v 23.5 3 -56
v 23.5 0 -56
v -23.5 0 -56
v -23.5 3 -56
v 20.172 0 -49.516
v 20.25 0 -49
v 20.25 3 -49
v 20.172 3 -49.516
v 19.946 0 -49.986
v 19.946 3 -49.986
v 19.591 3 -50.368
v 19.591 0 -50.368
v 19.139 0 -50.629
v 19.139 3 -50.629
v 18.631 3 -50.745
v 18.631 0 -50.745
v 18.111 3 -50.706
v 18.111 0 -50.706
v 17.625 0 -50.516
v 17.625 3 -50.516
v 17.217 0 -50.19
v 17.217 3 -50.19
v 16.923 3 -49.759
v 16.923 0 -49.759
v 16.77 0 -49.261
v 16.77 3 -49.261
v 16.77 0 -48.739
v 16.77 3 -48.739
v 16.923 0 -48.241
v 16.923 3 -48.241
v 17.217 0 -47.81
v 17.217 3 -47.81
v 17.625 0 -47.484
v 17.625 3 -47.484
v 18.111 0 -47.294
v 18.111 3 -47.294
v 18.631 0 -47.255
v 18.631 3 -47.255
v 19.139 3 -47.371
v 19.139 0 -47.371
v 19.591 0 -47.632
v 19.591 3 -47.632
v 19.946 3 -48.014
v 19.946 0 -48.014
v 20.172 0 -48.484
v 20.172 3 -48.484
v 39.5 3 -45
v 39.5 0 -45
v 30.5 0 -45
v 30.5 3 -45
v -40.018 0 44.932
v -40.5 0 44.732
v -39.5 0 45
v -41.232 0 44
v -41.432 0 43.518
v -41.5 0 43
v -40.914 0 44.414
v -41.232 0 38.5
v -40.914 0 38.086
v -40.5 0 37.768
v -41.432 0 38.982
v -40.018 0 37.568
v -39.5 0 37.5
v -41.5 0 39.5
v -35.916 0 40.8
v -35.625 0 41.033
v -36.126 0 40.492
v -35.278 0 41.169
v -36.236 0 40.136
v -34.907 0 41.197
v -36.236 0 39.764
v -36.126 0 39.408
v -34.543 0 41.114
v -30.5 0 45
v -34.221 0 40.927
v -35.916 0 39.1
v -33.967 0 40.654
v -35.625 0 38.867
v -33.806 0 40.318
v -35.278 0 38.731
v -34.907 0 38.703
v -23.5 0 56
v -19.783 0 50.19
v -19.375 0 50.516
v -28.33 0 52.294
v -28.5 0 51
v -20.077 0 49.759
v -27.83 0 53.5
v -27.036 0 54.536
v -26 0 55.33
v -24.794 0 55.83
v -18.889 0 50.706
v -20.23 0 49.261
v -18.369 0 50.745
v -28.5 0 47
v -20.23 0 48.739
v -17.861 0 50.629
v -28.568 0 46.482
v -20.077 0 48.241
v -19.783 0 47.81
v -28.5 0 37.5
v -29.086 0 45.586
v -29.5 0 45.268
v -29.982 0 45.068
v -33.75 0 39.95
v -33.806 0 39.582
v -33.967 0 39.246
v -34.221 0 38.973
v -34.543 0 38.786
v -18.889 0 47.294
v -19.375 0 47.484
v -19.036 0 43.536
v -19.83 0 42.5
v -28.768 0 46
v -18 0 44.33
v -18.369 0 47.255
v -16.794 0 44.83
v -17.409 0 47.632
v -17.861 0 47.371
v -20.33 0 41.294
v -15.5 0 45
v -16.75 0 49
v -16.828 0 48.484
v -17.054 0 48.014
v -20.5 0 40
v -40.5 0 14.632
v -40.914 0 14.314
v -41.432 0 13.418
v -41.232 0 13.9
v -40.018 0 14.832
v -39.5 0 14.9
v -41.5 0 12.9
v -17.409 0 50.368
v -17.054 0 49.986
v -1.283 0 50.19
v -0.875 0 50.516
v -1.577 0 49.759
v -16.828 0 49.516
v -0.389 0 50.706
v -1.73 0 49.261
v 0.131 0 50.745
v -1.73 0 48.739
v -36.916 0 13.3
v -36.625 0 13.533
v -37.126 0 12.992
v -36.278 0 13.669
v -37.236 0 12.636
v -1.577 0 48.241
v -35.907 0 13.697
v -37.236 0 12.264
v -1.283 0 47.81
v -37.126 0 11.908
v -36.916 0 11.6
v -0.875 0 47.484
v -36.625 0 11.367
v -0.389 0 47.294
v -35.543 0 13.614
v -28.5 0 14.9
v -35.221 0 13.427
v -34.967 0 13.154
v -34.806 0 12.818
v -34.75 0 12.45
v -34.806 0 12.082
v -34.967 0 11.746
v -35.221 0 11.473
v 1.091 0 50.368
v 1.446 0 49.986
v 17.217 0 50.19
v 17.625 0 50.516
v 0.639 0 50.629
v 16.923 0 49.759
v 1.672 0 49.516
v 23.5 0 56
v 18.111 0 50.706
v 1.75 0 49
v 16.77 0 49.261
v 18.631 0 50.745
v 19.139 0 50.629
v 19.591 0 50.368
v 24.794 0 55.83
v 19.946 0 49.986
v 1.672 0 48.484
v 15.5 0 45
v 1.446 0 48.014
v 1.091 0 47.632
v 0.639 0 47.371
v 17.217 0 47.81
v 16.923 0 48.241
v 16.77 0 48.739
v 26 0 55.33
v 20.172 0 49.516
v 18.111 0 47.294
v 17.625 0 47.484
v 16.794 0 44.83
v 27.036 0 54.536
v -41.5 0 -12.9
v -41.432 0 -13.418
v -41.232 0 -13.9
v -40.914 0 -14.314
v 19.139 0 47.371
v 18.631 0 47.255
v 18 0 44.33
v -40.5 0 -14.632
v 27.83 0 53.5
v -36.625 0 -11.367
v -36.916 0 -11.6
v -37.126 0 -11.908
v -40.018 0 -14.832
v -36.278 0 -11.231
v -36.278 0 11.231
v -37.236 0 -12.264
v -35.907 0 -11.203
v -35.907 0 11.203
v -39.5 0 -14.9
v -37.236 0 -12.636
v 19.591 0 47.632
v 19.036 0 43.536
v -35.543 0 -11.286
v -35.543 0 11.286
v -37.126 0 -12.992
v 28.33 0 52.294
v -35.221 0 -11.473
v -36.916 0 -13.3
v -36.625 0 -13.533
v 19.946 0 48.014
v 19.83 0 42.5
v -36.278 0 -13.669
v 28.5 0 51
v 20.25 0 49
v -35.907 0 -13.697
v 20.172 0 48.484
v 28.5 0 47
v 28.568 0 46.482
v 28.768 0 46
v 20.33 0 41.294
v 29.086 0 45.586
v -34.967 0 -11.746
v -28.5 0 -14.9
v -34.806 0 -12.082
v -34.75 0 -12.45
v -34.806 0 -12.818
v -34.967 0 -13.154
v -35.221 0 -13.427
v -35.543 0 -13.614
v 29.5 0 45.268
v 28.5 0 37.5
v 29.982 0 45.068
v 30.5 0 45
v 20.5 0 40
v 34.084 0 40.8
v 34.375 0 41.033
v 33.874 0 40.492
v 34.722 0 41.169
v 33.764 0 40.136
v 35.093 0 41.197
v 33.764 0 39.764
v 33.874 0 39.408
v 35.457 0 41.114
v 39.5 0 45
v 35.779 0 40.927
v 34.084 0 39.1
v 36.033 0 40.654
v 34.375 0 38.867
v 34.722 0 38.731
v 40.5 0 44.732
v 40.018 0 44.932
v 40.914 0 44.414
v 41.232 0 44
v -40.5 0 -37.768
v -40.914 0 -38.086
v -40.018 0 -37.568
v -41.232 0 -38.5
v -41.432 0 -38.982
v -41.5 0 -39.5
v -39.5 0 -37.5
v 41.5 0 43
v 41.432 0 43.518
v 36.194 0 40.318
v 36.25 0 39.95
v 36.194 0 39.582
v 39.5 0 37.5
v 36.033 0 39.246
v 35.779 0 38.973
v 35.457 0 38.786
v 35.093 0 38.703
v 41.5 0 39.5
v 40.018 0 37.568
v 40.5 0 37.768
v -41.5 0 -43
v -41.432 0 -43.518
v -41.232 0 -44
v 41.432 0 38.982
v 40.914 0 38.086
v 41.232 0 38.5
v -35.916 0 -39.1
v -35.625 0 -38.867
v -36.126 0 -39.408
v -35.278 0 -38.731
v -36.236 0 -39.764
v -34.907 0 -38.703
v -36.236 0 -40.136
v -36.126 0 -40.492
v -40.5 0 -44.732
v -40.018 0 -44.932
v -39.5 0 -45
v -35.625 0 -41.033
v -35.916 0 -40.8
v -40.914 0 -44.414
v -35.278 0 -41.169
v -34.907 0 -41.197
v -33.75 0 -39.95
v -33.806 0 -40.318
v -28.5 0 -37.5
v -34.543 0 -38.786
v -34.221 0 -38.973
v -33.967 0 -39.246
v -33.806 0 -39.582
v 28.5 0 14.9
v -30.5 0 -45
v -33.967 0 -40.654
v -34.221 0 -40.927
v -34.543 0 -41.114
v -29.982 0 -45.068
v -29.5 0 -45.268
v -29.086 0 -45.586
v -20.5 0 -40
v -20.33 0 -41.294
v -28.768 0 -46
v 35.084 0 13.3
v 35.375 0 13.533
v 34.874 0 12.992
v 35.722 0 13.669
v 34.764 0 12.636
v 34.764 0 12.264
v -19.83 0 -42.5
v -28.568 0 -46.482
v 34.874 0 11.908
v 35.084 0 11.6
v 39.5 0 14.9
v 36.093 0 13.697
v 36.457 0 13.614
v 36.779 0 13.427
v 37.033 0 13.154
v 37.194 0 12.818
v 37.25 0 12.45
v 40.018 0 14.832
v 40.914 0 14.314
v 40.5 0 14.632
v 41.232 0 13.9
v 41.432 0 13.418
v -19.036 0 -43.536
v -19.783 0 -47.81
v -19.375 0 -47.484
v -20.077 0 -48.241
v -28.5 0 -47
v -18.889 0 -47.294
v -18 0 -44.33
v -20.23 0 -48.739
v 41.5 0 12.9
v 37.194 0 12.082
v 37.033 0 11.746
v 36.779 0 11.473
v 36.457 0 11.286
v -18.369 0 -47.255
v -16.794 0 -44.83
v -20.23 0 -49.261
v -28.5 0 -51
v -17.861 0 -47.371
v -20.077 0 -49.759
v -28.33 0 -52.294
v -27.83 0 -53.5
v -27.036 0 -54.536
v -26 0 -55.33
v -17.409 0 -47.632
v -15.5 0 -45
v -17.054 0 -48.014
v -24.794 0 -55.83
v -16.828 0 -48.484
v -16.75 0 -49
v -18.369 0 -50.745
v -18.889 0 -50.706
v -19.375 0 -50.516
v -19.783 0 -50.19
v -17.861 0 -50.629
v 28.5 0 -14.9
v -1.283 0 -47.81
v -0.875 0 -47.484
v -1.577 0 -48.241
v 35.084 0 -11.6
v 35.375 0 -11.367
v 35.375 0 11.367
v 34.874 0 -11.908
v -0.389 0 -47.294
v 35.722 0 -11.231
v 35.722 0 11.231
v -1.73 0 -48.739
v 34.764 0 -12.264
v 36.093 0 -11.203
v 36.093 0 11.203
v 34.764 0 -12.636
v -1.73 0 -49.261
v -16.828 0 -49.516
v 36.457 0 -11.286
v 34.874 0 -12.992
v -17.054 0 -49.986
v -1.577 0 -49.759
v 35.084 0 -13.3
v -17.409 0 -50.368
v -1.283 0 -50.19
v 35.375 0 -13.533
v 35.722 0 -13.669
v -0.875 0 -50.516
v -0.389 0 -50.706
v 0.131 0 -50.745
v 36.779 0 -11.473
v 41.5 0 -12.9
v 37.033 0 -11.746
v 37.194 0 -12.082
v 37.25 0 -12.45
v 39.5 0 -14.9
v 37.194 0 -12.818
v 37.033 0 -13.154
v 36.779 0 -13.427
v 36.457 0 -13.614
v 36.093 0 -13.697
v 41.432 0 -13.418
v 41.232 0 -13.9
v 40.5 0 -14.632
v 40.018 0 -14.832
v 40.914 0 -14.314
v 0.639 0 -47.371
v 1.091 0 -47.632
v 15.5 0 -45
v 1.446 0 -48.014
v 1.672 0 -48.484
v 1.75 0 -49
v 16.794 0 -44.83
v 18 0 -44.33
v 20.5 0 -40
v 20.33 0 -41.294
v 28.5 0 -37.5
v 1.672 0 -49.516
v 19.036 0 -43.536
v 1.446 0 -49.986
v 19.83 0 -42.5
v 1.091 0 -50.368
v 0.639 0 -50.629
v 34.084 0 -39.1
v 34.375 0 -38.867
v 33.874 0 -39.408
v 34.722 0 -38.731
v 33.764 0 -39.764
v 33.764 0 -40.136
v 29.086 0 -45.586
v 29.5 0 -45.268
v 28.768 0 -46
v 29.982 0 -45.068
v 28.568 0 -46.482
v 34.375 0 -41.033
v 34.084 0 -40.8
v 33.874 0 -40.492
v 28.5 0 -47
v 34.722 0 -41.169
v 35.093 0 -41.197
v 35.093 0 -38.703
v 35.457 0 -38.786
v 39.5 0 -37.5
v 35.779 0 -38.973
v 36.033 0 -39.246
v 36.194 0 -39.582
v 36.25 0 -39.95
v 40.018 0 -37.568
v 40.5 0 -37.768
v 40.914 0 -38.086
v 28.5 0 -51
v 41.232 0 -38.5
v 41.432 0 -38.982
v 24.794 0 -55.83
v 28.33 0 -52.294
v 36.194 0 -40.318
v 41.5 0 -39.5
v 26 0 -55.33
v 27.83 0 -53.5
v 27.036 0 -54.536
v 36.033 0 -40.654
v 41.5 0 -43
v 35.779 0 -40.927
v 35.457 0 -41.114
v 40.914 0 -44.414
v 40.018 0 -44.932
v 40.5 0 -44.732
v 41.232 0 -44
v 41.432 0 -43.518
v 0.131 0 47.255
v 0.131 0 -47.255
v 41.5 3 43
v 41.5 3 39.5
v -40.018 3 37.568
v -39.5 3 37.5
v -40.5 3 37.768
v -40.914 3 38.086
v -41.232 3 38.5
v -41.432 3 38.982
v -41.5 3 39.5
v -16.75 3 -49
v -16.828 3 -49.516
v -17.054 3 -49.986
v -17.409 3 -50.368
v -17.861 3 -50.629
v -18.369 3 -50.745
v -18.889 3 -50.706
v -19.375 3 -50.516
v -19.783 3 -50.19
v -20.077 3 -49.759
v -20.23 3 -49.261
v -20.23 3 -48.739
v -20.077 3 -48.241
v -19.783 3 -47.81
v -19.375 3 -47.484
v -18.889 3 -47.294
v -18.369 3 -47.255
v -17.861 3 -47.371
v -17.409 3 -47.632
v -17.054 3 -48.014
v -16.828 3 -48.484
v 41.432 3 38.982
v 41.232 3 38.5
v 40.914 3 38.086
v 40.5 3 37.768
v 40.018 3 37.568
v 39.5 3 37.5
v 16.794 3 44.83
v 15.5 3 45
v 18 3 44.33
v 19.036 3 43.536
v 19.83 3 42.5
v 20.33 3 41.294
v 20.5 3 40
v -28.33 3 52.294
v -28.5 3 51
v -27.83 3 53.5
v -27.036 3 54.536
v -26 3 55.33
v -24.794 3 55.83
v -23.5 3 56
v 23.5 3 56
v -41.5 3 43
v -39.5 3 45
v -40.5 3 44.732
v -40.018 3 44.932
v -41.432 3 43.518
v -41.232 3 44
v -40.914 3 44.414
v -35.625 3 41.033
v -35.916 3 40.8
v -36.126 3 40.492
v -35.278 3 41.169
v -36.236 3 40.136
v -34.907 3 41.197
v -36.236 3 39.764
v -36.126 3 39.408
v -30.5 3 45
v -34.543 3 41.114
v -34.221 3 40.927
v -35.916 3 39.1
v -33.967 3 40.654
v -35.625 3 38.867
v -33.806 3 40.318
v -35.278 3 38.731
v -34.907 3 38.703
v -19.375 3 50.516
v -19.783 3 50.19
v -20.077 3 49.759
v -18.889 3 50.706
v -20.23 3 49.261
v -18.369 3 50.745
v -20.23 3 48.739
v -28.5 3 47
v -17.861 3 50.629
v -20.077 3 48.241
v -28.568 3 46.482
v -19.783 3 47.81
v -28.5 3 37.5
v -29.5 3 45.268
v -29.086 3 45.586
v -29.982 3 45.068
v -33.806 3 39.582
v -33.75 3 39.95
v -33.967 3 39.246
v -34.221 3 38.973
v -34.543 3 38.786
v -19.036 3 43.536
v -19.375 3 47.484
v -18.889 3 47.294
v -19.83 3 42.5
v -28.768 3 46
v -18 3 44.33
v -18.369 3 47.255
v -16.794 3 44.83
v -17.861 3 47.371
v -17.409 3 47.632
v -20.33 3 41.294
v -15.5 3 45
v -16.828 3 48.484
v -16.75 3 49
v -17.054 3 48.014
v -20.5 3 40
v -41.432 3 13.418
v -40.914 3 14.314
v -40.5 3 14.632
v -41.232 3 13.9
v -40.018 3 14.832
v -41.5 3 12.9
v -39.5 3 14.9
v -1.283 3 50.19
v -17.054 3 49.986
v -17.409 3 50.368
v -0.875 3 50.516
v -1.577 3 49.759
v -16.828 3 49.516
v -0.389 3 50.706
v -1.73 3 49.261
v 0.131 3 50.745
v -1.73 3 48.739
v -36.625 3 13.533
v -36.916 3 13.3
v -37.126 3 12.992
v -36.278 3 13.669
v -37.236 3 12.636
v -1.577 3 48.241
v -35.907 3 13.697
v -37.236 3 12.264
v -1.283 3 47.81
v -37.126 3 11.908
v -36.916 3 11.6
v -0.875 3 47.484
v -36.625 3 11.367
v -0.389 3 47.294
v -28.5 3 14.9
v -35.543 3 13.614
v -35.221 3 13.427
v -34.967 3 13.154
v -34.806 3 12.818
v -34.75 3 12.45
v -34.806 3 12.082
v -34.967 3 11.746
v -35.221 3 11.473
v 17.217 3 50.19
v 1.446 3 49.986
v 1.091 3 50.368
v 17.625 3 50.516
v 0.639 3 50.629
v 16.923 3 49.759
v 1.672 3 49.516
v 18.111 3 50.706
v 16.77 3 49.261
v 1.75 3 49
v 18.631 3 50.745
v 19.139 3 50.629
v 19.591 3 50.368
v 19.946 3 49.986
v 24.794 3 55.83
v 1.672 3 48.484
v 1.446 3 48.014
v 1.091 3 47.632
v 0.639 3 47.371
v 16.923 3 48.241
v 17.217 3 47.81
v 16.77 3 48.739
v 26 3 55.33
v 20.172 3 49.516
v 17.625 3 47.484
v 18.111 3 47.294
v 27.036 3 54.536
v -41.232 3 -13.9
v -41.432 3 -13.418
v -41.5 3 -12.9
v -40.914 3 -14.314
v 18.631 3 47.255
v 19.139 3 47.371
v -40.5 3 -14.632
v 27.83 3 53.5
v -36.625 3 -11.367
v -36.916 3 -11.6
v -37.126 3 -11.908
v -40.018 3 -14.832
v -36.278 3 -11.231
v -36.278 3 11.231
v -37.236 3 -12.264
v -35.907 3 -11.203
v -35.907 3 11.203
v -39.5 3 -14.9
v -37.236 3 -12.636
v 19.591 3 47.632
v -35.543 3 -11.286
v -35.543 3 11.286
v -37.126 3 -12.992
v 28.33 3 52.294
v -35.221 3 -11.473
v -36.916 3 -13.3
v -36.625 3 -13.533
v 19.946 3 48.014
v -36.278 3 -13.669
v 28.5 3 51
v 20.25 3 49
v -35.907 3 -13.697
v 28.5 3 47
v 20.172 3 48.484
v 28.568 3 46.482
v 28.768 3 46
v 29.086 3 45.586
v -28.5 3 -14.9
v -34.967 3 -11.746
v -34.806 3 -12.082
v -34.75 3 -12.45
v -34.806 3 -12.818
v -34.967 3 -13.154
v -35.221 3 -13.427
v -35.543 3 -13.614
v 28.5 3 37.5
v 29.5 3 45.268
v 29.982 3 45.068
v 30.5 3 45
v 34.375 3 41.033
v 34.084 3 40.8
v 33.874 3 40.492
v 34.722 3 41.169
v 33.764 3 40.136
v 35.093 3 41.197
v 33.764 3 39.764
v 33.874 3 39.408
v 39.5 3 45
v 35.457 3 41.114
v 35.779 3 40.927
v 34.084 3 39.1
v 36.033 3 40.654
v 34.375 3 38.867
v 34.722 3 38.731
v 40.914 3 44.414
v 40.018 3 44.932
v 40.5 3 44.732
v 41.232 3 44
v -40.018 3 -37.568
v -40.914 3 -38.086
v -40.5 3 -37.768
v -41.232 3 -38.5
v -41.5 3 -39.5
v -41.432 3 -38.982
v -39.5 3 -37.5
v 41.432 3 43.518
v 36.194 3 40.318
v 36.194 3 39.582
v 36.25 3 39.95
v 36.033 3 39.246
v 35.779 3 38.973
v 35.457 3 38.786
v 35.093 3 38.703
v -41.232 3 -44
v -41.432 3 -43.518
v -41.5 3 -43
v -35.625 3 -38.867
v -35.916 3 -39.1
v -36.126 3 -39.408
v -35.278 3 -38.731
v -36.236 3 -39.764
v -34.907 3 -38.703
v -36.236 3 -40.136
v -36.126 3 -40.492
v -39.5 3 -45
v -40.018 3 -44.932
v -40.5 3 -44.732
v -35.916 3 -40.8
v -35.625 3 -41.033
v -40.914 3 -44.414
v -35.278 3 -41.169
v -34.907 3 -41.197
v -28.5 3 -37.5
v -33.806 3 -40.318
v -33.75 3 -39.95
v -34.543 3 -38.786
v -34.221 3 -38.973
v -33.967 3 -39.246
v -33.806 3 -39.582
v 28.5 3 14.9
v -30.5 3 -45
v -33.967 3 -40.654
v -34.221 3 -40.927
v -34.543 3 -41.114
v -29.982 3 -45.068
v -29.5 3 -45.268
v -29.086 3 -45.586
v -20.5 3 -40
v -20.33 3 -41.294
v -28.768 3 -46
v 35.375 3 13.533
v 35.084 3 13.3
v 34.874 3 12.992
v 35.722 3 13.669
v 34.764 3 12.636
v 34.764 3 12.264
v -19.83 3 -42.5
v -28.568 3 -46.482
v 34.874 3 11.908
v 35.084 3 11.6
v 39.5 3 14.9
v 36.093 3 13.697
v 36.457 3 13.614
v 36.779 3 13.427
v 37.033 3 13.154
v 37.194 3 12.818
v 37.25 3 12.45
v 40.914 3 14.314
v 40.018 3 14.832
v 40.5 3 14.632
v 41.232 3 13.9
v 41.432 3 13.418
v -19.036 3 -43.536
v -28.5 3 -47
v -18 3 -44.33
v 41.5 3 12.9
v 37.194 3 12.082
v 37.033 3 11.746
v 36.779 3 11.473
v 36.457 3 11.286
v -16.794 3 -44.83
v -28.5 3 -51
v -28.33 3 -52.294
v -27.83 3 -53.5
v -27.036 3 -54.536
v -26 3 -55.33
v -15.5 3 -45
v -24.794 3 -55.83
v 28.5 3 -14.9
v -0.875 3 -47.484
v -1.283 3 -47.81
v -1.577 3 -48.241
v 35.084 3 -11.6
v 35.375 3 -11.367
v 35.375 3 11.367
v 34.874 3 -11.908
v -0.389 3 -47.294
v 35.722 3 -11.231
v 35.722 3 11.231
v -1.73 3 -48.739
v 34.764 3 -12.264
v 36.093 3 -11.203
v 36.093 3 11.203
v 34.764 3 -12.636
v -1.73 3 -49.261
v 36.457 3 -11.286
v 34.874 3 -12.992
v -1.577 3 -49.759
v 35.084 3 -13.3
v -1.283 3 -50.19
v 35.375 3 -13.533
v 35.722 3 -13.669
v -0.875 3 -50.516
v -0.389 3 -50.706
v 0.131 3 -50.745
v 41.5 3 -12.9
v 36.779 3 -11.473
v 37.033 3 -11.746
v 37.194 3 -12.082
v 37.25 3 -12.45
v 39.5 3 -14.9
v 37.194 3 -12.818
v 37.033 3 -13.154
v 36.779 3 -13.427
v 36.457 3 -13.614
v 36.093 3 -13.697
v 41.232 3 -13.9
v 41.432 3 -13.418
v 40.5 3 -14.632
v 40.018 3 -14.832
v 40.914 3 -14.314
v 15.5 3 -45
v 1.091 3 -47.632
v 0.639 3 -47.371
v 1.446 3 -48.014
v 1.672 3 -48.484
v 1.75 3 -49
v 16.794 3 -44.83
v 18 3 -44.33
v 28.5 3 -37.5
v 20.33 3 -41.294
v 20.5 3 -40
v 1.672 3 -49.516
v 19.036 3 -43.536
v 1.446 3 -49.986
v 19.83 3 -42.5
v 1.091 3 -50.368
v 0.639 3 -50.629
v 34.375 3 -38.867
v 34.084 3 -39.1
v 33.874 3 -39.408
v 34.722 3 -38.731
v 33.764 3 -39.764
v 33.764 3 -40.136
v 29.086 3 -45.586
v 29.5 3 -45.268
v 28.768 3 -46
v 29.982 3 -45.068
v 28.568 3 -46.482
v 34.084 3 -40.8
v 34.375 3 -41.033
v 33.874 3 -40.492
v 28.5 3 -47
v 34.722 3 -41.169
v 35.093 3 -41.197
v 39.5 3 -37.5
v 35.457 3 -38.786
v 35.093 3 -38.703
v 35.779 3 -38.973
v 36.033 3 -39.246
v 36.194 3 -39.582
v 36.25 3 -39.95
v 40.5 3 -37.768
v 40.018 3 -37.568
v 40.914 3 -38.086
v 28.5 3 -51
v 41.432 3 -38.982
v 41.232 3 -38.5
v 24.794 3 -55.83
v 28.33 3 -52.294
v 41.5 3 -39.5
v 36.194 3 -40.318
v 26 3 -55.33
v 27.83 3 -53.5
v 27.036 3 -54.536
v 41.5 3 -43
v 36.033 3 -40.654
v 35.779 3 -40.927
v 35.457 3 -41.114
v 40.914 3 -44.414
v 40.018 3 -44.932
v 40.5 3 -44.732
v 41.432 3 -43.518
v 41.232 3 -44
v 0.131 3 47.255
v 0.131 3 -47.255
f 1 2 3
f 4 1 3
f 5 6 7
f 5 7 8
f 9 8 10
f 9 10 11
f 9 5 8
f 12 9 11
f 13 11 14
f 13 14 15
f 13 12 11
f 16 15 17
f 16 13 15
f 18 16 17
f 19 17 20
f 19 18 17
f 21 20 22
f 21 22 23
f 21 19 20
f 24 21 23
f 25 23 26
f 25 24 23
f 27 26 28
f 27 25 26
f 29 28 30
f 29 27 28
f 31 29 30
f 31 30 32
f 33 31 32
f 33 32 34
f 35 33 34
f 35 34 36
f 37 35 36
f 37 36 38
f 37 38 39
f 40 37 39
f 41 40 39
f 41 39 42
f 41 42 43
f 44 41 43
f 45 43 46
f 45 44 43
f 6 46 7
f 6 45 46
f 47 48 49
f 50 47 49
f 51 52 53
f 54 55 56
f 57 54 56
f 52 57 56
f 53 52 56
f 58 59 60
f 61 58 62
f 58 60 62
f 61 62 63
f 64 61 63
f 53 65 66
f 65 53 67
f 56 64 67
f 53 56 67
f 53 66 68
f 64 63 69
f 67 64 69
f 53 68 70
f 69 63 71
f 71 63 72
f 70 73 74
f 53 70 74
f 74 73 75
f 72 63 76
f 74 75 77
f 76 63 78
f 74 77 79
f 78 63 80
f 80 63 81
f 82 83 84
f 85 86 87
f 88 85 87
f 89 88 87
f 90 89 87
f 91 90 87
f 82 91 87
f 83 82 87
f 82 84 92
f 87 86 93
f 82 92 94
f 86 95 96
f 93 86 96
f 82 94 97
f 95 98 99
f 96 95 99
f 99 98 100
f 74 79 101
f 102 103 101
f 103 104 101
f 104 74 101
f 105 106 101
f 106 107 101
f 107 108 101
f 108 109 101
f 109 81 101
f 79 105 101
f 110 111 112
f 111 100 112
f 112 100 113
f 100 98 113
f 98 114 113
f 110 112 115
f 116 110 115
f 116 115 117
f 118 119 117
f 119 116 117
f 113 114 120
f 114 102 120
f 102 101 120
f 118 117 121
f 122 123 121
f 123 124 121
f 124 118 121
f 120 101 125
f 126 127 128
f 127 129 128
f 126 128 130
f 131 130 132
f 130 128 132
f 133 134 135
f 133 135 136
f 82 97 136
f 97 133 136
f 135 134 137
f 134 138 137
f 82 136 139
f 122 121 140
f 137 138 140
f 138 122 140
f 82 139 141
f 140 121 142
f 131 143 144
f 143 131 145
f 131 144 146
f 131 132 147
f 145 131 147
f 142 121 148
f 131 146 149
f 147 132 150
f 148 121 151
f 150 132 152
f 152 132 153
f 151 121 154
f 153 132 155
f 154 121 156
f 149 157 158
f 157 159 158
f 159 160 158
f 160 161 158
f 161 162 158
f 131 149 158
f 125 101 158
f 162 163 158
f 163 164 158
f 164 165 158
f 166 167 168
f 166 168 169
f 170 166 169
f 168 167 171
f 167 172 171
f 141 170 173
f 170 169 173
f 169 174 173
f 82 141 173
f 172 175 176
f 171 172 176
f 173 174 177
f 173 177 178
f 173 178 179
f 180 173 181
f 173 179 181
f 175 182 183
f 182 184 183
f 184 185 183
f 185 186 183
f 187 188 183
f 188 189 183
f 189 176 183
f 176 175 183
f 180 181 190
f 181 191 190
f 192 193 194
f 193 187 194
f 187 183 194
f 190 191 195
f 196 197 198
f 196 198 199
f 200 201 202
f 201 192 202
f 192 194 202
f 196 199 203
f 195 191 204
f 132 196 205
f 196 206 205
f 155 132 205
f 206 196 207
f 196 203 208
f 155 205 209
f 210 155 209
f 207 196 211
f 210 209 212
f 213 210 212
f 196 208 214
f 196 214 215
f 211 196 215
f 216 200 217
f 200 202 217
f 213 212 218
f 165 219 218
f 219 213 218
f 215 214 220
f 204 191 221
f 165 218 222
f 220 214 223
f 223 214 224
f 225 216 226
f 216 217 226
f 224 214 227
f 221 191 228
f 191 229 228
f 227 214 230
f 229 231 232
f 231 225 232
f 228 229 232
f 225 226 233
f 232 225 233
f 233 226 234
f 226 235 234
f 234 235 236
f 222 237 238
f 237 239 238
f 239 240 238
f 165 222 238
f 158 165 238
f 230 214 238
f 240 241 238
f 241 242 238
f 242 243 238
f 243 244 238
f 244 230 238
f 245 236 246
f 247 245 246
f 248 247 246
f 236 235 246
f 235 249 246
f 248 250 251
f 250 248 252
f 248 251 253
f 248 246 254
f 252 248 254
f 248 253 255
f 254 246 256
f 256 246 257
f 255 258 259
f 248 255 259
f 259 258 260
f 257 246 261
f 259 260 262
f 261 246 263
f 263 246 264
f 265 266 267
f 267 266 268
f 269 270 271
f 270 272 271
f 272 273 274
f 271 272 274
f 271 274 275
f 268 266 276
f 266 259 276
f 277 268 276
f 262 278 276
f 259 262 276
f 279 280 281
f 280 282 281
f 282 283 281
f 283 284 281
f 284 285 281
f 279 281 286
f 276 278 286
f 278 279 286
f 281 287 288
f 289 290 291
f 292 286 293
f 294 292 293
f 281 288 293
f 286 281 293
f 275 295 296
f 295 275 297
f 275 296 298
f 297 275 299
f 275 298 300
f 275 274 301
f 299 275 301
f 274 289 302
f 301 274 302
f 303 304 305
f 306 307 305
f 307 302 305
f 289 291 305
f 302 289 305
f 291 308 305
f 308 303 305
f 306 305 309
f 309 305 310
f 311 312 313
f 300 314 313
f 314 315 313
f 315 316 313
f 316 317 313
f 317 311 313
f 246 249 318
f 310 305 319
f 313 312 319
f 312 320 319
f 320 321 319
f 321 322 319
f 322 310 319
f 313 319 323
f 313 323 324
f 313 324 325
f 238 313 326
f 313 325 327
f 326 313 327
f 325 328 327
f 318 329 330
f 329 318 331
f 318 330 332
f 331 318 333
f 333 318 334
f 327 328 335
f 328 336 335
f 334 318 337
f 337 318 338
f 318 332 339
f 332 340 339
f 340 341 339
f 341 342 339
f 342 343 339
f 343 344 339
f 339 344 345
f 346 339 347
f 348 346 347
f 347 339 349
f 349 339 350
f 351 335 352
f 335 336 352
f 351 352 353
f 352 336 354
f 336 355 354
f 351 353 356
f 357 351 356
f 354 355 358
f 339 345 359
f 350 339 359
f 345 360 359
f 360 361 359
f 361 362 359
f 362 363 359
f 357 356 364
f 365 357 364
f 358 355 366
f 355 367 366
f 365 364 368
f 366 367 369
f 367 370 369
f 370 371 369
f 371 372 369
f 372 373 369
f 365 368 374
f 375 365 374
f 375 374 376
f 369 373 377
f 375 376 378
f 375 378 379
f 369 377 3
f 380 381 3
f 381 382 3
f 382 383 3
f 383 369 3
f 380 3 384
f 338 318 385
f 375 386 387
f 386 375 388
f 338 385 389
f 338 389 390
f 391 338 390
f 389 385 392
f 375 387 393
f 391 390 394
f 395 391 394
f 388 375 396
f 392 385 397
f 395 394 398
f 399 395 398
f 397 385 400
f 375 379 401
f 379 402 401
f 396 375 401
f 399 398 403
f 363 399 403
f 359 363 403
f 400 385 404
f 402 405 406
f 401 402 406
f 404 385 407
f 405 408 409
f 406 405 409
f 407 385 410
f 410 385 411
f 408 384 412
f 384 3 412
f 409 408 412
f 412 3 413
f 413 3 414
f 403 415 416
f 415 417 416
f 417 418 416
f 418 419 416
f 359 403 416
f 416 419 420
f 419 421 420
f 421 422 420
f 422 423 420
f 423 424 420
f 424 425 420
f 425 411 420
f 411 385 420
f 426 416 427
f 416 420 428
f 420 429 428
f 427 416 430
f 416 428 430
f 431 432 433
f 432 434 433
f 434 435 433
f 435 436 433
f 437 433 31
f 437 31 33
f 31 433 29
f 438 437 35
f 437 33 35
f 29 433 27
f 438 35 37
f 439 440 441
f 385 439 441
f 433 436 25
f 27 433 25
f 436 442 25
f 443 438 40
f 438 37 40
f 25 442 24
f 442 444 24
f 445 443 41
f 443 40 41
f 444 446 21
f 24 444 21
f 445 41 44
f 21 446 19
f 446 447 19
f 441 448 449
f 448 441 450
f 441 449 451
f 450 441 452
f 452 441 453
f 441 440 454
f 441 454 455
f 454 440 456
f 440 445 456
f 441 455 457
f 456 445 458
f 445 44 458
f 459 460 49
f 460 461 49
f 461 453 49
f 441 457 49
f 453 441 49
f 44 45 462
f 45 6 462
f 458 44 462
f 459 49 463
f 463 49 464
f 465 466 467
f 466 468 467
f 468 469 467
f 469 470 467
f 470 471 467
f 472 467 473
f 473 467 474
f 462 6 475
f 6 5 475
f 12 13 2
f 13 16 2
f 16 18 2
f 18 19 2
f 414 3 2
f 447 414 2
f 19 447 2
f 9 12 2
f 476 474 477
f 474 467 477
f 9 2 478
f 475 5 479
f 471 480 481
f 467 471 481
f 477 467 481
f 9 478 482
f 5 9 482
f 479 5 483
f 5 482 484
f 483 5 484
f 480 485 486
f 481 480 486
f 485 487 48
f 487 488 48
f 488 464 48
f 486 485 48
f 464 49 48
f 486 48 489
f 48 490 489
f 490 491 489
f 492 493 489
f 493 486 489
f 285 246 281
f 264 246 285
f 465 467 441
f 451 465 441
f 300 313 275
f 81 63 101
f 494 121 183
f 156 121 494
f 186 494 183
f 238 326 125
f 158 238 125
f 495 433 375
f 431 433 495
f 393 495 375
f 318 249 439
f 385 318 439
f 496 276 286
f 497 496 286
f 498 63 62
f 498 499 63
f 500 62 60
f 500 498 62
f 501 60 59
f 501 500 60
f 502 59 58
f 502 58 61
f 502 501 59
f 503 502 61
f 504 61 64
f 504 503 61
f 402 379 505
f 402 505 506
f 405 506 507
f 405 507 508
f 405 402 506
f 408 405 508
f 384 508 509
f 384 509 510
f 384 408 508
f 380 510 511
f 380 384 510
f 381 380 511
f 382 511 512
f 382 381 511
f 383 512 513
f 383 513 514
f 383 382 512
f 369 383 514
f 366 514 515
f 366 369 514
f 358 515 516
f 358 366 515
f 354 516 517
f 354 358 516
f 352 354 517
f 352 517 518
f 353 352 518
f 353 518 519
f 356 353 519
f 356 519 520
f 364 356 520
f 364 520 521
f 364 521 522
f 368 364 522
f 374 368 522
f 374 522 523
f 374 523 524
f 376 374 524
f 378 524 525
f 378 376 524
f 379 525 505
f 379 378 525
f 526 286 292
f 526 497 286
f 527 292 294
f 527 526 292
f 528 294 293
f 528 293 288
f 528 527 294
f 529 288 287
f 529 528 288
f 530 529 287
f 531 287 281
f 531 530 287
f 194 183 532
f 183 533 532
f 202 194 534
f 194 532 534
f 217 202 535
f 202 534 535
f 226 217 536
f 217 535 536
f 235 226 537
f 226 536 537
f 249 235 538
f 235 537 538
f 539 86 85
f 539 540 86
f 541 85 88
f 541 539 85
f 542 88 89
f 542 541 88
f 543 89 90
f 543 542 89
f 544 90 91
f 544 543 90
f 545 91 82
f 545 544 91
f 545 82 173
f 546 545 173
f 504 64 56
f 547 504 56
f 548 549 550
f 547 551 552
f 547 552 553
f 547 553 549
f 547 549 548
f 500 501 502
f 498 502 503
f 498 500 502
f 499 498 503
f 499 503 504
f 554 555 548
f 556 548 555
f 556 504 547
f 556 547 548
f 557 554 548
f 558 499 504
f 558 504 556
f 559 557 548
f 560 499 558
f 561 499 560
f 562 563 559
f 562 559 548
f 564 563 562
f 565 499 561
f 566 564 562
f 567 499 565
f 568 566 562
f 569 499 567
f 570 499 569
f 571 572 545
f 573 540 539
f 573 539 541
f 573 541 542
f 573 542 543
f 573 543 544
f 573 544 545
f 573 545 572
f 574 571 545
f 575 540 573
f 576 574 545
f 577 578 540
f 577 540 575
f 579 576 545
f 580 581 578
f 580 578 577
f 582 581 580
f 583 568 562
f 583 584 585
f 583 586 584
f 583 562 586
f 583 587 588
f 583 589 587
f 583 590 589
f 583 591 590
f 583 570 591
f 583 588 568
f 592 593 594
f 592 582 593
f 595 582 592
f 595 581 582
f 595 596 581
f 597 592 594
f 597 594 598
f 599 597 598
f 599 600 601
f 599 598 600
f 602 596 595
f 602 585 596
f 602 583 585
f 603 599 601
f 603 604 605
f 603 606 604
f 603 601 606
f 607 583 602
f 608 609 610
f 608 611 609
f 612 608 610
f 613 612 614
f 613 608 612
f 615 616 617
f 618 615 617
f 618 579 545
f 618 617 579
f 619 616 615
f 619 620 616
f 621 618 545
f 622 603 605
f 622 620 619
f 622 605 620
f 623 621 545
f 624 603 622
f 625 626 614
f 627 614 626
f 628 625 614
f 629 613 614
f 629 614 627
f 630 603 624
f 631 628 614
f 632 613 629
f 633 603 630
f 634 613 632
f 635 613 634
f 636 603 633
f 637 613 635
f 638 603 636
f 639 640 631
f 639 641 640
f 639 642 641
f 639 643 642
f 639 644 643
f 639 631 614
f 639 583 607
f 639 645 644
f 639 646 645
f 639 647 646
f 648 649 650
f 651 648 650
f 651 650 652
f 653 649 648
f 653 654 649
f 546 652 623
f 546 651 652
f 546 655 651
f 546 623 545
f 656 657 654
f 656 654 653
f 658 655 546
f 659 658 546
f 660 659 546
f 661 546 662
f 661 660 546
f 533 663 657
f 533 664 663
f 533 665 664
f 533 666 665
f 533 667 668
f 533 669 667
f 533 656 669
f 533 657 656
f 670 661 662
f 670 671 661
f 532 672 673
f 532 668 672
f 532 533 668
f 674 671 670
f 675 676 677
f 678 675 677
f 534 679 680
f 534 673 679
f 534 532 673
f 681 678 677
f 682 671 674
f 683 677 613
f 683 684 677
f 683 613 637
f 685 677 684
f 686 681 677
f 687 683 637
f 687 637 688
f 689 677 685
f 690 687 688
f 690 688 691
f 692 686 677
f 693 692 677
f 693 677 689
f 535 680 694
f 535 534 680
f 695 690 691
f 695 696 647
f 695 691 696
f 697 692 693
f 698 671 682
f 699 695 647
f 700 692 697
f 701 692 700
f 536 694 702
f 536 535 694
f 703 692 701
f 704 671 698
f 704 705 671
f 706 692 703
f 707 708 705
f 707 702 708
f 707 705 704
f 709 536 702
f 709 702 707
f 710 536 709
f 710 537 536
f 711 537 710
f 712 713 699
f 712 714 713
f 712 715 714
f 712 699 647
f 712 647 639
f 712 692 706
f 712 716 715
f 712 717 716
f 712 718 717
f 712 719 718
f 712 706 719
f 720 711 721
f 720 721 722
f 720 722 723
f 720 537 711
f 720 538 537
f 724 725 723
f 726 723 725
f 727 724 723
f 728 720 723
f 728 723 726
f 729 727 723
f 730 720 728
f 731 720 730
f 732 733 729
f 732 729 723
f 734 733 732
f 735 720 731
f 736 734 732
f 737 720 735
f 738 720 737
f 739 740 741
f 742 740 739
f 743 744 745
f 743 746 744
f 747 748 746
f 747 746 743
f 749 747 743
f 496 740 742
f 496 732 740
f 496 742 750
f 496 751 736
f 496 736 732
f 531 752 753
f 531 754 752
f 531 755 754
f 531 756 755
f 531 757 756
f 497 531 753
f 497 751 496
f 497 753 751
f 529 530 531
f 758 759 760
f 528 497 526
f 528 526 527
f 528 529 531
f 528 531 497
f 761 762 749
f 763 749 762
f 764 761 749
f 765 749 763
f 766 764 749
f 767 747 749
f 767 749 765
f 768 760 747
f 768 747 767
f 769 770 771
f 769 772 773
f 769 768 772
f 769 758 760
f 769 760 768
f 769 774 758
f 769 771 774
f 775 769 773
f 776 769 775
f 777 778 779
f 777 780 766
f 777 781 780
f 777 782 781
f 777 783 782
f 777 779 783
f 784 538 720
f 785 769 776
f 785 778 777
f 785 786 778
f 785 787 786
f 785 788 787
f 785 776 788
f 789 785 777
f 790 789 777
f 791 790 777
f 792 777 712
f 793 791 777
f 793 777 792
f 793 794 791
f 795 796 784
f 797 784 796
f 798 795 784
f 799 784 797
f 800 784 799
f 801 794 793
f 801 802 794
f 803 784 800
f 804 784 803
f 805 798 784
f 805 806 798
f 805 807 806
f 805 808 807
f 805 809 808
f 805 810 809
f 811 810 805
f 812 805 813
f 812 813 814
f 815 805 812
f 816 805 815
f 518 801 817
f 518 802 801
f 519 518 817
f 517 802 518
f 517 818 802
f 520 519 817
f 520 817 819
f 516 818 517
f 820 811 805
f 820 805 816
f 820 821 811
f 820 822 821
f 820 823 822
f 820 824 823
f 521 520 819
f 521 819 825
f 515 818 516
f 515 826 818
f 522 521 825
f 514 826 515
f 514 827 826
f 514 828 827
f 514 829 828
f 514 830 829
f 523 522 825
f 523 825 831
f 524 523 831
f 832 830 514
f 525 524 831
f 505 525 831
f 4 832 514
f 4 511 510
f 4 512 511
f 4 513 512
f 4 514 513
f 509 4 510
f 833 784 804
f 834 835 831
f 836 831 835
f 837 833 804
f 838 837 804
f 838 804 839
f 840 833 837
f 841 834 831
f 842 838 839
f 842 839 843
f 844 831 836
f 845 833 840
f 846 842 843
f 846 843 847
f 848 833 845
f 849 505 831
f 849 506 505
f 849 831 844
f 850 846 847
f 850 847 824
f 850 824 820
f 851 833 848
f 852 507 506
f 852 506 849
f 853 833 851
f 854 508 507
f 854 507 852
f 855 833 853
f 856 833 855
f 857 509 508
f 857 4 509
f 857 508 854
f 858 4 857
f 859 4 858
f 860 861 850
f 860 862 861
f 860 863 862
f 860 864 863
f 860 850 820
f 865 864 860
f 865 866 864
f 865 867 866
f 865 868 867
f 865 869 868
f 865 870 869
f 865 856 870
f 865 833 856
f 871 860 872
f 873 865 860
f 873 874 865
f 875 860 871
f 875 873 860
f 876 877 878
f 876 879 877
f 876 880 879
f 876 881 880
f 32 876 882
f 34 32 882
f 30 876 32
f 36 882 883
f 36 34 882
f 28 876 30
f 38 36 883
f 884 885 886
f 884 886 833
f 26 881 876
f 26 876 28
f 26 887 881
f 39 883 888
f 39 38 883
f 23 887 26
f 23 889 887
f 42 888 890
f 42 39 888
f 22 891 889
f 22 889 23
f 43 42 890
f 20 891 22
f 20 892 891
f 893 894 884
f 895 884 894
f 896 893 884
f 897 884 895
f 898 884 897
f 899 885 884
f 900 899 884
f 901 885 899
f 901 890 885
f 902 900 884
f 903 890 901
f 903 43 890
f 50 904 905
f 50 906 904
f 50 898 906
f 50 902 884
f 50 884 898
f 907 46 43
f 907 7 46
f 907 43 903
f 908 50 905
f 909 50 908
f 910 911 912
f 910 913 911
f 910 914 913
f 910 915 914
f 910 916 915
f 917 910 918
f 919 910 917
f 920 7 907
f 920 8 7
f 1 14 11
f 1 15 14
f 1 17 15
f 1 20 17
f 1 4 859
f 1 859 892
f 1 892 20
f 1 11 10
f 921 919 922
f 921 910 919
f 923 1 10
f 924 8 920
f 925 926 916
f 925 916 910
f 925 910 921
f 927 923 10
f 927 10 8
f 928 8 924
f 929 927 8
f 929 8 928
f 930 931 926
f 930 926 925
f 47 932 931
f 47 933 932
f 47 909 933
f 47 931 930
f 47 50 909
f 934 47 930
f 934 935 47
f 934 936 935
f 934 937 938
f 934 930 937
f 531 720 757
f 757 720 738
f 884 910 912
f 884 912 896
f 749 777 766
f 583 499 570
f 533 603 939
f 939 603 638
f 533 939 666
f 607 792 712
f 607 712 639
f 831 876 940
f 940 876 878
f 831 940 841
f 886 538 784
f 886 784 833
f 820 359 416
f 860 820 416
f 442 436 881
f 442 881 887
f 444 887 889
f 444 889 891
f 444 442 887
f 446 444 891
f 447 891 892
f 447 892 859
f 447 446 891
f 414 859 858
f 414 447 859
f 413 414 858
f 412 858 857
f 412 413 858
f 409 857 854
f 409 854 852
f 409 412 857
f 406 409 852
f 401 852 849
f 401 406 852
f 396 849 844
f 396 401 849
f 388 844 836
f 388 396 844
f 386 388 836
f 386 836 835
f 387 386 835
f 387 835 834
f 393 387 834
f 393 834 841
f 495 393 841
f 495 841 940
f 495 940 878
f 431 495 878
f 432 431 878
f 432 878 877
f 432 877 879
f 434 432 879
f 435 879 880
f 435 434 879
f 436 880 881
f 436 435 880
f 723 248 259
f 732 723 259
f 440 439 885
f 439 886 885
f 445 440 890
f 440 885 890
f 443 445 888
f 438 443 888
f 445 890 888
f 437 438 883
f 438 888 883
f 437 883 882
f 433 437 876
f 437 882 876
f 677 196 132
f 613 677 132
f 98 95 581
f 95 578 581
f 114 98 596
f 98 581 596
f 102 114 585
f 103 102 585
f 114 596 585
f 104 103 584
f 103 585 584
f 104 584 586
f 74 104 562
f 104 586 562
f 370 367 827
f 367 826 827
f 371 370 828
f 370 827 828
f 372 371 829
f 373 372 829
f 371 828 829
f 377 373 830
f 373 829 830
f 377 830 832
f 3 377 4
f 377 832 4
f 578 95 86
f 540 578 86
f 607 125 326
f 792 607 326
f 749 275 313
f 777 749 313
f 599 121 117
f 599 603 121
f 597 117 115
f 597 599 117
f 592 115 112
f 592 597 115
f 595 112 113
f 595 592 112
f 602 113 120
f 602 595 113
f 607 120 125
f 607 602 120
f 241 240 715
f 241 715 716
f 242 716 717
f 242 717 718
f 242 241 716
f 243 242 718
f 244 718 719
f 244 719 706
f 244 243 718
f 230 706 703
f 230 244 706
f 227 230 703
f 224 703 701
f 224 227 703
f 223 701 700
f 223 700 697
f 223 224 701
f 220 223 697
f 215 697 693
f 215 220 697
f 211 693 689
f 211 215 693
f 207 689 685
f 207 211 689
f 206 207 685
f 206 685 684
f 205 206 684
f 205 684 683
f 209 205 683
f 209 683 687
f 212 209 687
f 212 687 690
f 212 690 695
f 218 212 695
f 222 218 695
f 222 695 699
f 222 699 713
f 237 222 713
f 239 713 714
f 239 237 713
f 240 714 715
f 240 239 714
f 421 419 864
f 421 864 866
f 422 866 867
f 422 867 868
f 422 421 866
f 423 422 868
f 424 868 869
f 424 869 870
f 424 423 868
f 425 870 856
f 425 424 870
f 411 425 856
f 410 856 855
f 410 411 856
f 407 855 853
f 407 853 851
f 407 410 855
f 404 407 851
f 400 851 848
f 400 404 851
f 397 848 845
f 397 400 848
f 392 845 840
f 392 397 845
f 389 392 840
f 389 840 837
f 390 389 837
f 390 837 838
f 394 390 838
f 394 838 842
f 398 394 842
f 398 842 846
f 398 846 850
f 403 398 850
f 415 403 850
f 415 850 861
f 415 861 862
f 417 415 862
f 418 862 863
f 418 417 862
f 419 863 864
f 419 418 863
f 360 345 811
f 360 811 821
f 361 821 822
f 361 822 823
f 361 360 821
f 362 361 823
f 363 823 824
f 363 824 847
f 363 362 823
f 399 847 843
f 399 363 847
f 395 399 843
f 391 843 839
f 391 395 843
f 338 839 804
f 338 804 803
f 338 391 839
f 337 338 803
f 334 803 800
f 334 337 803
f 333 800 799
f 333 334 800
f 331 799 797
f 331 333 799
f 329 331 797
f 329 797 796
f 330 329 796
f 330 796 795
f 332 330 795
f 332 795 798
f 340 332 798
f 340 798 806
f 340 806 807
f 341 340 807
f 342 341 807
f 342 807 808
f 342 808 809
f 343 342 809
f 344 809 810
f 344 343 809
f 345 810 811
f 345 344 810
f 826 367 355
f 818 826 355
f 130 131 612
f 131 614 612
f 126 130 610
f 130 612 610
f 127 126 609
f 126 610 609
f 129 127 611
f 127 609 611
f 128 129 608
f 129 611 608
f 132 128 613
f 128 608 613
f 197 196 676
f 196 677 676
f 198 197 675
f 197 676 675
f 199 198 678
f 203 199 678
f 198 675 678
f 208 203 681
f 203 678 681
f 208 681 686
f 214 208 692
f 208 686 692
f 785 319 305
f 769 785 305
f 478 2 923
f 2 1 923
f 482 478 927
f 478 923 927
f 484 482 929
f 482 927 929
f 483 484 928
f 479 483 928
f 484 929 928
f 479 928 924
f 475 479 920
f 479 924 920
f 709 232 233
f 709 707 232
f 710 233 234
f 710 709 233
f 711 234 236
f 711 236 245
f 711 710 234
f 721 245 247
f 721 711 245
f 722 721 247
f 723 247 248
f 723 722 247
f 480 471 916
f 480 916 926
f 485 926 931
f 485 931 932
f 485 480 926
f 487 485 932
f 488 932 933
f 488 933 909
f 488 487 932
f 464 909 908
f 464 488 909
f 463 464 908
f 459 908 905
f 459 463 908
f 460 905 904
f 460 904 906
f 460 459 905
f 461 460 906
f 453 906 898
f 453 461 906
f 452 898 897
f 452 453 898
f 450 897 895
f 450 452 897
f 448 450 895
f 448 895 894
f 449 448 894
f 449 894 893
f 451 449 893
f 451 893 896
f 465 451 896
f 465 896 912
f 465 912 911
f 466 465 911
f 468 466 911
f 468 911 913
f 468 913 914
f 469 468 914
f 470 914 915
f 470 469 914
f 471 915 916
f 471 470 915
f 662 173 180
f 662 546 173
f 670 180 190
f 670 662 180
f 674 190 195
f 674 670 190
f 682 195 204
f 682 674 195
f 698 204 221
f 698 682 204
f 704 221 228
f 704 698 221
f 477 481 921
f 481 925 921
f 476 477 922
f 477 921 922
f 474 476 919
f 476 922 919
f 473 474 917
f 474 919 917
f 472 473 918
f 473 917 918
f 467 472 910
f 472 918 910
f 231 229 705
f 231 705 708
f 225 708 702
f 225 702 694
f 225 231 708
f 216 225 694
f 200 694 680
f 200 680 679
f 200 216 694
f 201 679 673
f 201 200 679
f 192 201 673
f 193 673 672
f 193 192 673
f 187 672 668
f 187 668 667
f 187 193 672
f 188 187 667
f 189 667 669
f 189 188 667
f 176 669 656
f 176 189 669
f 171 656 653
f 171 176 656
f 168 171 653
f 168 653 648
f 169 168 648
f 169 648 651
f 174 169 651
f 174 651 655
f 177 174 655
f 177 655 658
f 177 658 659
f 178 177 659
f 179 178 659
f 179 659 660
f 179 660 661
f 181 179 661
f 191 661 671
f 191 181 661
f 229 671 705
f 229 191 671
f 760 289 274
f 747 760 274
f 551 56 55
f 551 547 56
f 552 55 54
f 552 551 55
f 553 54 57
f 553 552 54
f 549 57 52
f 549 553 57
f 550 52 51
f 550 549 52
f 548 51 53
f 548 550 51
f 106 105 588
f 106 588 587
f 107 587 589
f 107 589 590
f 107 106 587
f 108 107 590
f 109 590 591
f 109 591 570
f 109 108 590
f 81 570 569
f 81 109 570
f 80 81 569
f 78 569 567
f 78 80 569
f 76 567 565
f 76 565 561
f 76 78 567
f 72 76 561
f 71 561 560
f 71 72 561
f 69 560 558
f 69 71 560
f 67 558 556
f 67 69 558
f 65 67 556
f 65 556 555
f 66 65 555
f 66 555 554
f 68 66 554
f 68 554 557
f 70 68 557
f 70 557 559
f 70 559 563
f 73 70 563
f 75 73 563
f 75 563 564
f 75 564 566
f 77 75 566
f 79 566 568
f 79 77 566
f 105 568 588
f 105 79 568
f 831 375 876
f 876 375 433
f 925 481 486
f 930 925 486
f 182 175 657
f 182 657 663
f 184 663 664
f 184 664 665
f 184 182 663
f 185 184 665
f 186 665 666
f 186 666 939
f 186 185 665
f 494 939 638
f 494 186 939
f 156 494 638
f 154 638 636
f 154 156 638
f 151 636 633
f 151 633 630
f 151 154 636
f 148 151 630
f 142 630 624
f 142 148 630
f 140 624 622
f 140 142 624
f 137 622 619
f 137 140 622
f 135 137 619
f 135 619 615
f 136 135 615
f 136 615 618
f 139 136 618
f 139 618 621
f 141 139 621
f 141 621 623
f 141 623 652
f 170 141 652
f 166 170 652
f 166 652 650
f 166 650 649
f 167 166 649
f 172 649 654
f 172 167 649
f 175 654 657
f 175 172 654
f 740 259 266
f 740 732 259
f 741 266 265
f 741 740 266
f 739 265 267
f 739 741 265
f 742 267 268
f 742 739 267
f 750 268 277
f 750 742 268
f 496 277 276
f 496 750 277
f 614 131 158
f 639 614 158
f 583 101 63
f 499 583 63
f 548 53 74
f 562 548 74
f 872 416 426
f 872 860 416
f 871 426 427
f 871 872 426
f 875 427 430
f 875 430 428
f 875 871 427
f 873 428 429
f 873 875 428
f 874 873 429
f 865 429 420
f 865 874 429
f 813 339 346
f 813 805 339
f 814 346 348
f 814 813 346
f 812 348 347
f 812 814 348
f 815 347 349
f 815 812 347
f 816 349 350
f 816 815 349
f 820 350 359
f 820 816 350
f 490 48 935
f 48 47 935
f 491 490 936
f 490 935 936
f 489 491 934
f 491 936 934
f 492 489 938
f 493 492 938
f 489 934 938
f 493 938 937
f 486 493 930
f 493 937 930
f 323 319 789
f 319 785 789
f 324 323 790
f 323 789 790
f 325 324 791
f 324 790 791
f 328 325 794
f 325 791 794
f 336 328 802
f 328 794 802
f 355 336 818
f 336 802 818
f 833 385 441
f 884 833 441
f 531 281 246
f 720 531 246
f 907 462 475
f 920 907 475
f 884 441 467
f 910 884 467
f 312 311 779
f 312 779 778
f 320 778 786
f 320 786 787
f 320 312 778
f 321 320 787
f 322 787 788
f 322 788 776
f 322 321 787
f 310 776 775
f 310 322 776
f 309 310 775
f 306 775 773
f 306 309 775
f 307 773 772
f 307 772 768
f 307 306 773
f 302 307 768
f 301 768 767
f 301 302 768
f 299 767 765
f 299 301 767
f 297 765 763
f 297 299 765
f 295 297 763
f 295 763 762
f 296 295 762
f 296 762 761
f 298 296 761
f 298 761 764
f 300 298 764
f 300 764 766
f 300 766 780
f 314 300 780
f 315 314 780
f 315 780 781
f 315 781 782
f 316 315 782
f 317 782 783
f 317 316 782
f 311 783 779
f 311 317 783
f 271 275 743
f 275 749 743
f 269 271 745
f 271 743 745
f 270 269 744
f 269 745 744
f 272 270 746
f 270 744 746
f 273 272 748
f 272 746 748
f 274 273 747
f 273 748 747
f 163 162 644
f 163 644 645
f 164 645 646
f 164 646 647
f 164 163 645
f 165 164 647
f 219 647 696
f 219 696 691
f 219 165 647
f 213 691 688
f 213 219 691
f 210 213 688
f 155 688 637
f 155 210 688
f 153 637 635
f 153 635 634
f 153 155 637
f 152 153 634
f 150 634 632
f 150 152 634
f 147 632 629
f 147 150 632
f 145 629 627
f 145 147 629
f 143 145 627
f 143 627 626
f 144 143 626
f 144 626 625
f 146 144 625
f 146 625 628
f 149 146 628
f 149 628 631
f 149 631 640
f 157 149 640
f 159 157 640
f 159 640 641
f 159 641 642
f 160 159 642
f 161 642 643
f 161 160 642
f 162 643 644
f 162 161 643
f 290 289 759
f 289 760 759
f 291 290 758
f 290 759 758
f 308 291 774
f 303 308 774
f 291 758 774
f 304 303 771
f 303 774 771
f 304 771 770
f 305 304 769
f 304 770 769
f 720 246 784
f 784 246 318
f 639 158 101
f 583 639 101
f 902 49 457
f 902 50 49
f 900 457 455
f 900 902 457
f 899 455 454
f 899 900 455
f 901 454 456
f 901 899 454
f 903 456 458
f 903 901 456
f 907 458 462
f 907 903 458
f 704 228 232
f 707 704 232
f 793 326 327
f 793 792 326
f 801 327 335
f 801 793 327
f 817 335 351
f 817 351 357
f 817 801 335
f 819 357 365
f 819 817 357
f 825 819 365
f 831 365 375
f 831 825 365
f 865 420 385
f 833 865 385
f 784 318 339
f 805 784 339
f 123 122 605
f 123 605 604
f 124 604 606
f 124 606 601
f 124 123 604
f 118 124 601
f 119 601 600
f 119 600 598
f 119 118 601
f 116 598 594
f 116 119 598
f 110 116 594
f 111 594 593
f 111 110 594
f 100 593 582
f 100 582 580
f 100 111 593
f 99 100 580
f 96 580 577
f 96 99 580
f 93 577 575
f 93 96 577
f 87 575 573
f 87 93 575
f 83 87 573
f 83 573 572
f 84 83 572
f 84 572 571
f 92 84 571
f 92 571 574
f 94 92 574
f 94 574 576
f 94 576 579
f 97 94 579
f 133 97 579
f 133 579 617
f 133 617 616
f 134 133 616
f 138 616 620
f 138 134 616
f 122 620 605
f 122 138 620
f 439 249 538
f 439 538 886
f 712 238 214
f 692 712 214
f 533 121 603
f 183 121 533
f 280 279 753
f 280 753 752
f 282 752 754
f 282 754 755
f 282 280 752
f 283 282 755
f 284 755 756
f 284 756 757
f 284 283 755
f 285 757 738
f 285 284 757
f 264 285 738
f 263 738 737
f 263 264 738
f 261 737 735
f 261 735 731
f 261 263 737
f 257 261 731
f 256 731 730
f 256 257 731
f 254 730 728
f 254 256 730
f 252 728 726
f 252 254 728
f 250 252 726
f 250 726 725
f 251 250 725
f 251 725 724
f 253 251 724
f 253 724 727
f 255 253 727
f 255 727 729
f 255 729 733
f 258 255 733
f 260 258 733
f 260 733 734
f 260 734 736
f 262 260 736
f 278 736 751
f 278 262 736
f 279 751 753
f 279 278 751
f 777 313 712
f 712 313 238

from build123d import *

# Parameters (mm, degrees)
SKETCH_1_W      = 41
SKETCH_1_H      = 90
SKETCH_1_R      = 1.25
SKETCH_1_R_2    = 1.75
EXTRUDE_1_DEPTH = 3
FILLET_1_R      = 2
FILLET_2_R      = 5
FILLET_3_R      = 2


with BuildPart() as part:
    # 草图1 → 凸台-拉伸1 (new body)
    with BuildSketch(Plane(origin=(0, 0, 0), x_dir=(1, 0, 0), z_dir=(0, 1, 0))):
        Polygon((-28.5, -37.5), (-41.5, -37.5), (-41.5, -45), (-28.5, -45), (-28.5, -56), (28.5, -56), (28.5, -45), (41.5, -45), (41.5, -37.5), (28.5, -37.5), (28.5, -14.9), (41.5, -14.9), (41.5, 14.9), (28.5, 14.9), (28.5, 37.5), (41.5, 37.5), (41.5, 45), (28.5, 45), (28.5, 56), (-28.5, 56), (-28.5, 45), (-41.5, 45), (-41.5, 37.5), (-28.5, 37.5), (-28.5, 14.9), (-41.5, 14.9), (-41.5, -14.9), (-28.5, -14.9), align=None)
        Rectangle(SKETCH_1_W, SKETCH_1_H, mode=Mode.SUBTRACT)
        with Locations((-35, -39.95)):
            Circle(SKETCH_1_R, mode=Mode.SUBTRACT)
        with Locations((18.5, -49)):
            Circle(SKETCH_1_R_2, mode=Mode.SUBTRACT)
        with Locations((-18.5, -49)):
            Circle(SKETCH_1_R_2, mode=Mode.SUBTRACT)
        with Locations((-36, 12.45)):
            Circle(SKETCH_1_R, mode=Mode.SUBTRACT)
        with Locations((-36, -12.45)):
            Circle(SKETCH_1_R, mode=Mode.SUBTRACT)
        with Locations((0, -49)):
            Circle(SKETCH_1_R_2, mode=Mode.SUBTRACT)
        with Locations((18.5, 49)):
            Circle(SKETCH_1_R_2, mode=Mode.SUBTRACT)
        with Locations((-18.5, 49)):
            Circle(SKETCH_1_R_2, mode=Mode.SUBTRACT)
        with Locations((0, 49)):
            Circle(SKETCH_1_R_2, mode=Mode.SUBTRACT)
        with Locations((-35, 39.95)):
            Circle(SKETCH_1_R, mode=Mode.SUBTRACT)
        with Locations((35, 39.95)):
            Circle(SKETCH_1_R, mode=Mode.SUBTRACT)
        with Locations((35, -39.95)):
            Circle(SKETCH_1_R, mode=Mode.SUBTRACT)
        with Locations((36, 12.45)):
            Circle(SKETCH_1_R, mode=Mode.SUBTRACT)
        with Locations((36, -12.45)):
            Circle(SKETCH_1_R, mode=Mode.SUBTRACT)
    extrude(amount=EXTRUDE_1_DEPTH)

    # 圆角1
    fillet_1_edges = [part.edges().sort_by_distance(p)[0] for p in [
        (-41.5, 1.5, 45),
        (-41.5, 1.5, 37.5),
        (-41.5, 1.5, 14.9),
        (-41.5, 1.5, -14.9),
        (-41.5, 1.5, -37.5),
        (-41.5, 1.5, -45),
        (41.5, 1.5, -45),
        (41.5, 1.5, -37.5),
        (41.5, 1.5, -14.9),
        (41.5, 1.5, 14.9),
        (41.5, 1.5, 37.5),
        (41.5, 1.5, 45),
    ]]
    fillet(fillet_1_edges, radius=FILLET_1_R)

    # 圆角2
    fillet_2_edges = [part.edges().sort_by_distance(p)[0] for p in [
        (28.5, 1.5, 56),
        (-28.5, 1.5, 56),
        (-28.5, 1.5, -56),
        (28.5, 1.5, -56),
        (20.5, 1.5, 45),
        (20.5, 1.5, -45),
        (-20.5, 1.5, -45),
        (-20.5, 1.5, 45),
    ]]
    fillet(fillet_2_edges, radius=FILLET_2_R)

    # 圆角3
    fillet_3_edges = [part.edges().sort_by_distance(p)[0] for p in [
        (-28.5, 1.5, 45),
        (-28.5, 1.5, -45),
        (28.5, 1.5, -45),
        (28.5, 1.5, 45),
    ]]
    fillet(fillet_3_edges, radius=FILLET_3_R)


solid = part.part
